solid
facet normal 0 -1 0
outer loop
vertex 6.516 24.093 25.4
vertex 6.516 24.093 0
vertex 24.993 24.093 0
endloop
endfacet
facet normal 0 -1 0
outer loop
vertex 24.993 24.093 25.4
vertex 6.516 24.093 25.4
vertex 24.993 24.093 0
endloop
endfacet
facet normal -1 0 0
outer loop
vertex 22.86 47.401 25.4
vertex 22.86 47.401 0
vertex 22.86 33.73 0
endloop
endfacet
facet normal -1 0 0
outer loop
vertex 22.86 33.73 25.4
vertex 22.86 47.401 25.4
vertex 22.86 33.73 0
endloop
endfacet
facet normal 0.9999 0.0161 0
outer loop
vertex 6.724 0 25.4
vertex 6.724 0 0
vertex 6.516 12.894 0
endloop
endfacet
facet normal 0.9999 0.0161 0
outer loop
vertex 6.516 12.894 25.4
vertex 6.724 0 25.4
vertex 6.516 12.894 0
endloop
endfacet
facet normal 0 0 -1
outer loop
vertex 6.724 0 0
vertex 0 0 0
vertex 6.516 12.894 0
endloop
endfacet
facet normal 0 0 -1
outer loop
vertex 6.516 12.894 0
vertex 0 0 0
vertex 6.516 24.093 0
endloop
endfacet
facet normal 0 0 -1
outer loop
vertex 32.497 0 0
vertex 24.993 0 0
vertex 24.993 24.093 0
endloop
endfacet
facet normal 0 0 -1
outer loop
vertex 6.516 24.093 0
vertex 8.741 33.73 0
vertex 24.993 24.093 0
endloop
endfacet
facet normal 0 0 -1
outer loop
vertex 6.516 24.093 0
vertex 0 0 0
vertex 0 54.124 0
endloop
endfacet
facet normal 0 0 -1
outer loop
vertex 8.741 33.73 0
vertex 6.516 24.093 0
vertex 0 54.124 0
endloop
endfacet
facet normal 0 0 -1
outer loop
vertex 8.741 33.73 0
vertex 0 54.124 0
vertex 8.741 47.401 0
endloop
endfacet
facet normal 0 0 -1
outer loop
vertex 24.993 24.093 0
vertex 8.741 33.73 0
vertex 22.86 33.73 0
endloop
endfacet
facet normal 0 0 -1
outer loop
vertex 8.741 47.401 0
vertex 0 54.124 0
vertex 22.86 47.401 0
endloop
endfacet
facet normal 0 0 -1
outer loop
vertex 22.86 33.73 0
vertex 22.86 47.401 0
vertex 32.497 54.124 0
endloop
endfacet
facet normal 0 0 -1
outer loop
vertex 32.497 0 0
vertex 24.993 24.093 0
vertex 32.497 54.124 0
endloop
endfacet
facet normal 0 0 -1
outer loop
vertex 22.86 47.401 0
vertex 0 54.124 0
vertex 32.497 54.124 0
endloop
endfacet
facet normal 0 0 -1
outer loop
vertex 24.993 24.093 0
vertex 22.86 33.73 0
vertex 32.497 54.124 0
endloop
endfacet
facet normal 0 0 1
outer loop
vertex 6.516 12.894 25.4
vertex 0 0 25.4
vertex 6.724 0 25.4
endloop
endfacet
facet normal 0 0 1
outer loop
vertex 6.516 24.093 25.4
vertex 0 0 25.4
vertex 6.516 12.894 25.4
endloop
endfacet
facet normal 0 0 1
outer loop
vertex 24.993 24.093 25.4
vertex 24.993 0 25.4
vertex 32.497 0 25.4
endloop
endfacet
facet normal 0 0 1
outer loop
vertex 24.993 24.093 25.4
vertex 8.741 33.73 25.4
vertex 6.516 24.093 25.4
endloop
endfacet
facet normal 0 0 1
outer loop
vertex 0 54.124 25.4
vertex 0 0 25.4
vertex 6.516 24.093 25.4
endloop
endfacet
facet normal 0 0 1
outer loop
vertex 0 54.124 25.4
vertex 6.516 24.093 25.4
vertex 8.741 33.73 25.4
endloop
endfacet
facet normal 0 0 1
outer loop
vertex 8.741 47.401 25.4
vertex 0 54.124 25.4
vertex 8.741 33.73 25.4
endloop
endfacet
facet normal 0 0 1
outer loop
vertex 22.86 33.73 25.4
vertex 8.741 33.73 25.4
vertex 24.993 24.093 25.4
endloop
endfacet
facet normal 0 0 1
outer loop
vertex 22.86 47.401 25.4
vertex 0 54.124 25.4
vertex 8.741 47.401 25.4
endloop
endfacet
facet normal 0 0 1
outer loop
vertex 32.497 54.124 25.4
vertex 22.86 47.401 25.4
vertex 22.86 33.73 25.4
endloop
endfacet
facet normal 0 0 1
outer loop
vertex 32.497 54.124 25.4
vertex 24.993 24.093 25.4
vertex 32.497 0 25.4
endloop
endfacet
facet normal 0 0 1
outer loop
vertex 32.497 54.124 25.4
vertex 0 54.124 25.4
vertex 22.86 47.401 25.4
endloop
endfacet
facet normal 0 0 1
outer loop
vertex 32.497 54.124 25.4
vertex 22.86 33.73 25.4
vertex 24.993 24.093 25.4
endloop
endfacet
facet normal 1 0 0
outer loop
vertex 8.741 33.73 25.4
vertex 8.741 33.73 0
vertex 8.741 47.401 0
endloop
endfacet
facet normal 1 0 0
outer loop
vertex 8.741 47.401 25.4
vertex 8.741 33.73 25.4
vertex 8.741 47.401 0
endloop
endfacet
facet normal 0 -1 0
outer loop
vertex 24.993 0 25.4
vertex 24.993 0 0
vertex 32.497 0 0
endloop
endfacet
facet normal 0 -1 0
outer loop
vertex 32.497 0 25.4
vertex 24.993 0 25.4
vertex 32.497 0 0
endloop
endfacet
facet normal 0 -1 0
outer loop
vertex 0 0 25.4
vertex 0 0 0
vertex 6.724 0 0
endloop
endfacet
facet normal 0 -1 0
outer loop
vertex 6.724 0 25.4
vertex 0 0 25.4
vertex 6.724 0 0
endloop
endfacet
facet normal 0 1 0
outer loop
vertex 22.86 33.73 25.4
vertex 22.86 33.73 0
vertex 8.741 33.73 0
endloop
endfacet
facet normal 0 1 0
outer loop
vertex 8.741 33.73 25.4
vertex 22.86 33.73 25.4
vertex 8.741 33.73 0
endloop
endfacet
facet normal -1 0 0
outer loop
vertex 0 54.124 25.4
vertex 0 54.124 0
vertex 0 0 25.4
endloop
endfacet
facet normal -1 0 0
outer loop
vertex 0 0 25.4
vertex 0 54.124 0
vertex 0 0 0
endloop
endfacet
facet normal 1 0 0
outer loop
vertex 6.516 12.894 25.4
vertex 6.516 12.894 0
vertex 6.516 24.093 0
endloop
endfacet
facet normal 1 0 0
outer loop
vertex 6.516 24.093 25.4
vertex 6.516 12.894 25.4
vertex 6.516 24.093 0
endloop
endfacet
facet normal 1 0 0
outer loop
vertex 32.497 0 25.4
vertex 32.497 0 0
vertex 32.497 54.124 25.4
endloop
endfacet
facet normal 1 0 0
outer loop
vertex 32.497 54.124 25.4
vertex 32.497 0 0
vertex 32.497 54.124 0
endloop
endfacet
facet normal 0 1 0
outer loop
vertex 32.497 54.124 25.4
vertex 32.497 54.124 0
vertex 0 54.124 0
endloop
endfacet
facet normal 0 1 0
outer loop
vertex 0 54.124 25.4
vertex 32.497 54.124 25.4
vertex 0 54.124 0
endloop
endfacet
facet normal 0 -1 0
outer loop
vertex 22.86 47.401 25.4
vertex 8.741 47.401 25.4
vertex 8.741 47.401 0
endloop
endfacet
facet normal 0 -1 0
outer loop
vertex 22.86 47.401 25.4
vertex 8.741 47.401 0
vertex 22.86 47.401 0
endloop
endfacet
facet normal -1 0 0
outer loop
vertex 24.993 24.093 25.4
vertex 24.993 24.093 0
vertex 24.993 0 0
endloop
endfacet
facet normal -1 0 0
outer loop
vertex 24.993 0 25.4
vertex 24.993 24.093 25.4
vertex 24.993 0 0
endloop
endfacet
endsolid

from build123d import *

# Parameters (mm, degrees)
F1_DEPTH = 25.4


with BuildPart() as f1:
    # F0 (on Top) → F1 (new body)
    with BuildSketch(Plane.XY):
        Polygon((0, 1.544545), (0, 0), (6.723529, 0), (6.515557, 12.894255), (6.515557, 24.092648), (15.912354, 24.092648), (24.992656, 24.092648), (24.992656, 1.972236), (24.992656, 0), (32.49706, 0), (32.49706, 54.124411), (0, 54.124411), (0, 37.675023), (0, 3.922059), align=None)
        Polygon((8.740585, 33.729706), (8.740585, 46.280295), (8.740585, 47.400884), (22.860004, 47.400884), (22.860004, 33.729706), (15.912354, 33.729706), align=None, mode=Mode.SUBTRACT)
    extrude(amount=F1_DEPTH)


solid = f1.part
